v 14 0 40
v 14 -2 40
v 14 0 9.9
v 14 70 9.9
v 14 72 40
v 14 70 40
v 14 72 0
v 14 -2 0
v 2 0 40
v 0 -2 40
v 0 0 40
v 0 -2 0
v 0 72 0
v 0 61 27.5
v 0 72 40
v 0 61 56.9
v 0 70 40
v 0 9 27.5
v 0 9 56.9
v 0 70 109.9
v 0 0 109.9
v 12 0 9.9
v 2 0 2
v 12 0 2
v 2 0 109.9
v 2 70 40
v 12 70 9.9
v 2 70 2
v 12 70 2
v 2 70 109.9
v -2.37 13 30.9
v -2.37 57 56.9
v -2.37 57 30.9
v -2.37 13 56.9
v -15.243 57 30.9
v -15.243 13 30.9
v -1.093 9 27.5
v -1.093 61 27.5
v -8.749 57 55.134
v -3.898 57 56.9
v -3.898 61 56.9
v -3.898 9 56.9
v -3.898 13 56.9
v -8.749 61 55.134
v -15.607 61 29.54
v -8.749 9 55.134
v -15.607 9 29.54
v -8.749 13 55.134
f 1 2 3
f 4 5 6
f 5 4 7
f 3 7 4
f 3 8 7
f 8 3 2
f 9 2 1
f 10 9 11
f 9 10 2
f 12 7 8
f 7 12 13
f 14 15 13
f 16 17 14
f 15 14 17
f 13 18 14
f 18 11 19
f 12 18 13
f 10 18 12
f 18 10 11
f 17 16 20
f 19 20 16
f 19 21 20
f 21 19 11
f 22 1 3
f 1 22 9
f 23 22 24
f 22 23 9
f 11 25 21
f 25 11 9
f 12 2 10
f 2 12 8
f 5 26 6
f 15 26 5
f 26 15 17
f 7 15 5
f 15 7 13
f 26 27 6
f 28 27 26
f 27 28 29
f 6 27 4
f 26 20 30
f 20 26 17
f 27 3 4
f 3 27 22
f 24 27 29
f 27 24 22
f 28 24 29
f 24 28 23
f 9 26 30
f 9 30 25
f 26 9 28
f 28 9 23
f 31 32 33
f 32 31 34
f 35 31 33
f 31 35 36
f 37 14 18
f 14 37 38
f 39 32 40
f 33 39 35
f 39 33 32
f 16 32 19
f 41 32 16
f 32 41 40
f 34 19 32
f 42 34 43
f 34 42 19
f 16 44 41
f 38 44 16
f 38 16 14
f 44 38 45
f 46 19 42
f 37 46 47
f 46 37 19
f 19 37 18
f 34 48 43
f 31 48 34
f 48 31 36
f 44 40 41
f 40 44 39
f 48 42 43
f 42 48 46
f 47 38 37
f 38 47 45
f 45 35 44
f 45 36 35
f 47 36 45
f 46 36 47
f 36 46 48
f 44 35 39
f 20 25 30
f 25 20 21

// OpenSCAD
//PhoneHolder

//variables

//modules
xRectangle = 2;
yRectangle = 70;
zRectangle = 109.9;

xFrontSide = 14;
yFrontSide = 2;
zFrontSide= 40;

xFrontCenter = 2;
yFrontCenter = yRectangle;
zFrontCenter= 9.9;

yBackBoxTranslation = 9;
zBackBoxTranslation = 56.9;

xBackBox = 2.37;
yBackBox = 52;
zBackBox = 29.4;

xSideBackBox = 16-xBackBox;
ySideBackBox = 4;
zSideBackBox = zBackBox;

xBottomBackBox = 16-xBackBox;
yBottomBackBox = 44.2;
zBottomBackBox = zBackBox - 26;


module mainRectangle(){
       cube([xRectangle, yRectangle, zRectangle]);
}

module frontSide(){
       cube([xFrontSide, yFrontSide, zFrontSide]);
}

module frontCenter(){
       cube([xFrontCenter, yFrontCenter, zFrontCenter]);
}

module frontBox(){
    union(){
        translate([0,-yFrontSide,0])
            frontSide();
        translate([0,yRectangle,0])
            frontSide();
        translate ([xFrontSide-xRectangle,0,0])
            frontCenter();
        translate([xRectangle,0,0])
            cube([xFrontSide-xFrontCenter-xRectangle,yRectangle,yFrontSide]);
    }    
}

module backBox(){
    union(){
        translate([-xBackBox,yBackBoxTranslation,zBackBoxTranslation-zBackBox])
            cube([xBackBox, yBackBox, zBackBox]);
        translate([-xBackBox-xSideBackBox,yBackBoxTranslation,zBackBoxTranslation-zBackBox])
            cube([xSideBackBox, ySideBackBox, zSideBackBox]);
         translate([-xBackBox-xSideBackBox,yBackBoxTranslation+yBackBox-ySideBackBox,zBackBoxTranslation-zBackBox])
            cube([xSideBackBox, ySideBackBox, zSideBackBox]);
        difference(){
        translate([-xBackBox-xSideBackBox,yBackBoxTranslation+yBackBox-ySideBackBox-yBottomBackBox,zBackBoxTranslation-zBackBox])
            cube([xBottomBackBox, yBottomBackBox, zBottomBackBox]);
        #translate([-10,30,26])
            rotate([0,8,0])
                cube([180,90,1], center = true);
    }
    }
}

module backBoxFinal(){
    difference(){
        backBox();
        #translate([-10,30,60])
            rotate([0,-20,0])
                cube([180,90,10], center = true);
        #translate([-5,30,23])
            rotate([0,8,0])
                cube([180,90,10], center = true);
        #translate([-22,30,25])
            rotate([0,-75,0])
                cube([180,90,10], center = true);
    }
}
module phoneHolder(){
    union(){
        mainRectangle();    
        frontBox();
        backBoxFinal();
    }   
}

phoneHolder();
